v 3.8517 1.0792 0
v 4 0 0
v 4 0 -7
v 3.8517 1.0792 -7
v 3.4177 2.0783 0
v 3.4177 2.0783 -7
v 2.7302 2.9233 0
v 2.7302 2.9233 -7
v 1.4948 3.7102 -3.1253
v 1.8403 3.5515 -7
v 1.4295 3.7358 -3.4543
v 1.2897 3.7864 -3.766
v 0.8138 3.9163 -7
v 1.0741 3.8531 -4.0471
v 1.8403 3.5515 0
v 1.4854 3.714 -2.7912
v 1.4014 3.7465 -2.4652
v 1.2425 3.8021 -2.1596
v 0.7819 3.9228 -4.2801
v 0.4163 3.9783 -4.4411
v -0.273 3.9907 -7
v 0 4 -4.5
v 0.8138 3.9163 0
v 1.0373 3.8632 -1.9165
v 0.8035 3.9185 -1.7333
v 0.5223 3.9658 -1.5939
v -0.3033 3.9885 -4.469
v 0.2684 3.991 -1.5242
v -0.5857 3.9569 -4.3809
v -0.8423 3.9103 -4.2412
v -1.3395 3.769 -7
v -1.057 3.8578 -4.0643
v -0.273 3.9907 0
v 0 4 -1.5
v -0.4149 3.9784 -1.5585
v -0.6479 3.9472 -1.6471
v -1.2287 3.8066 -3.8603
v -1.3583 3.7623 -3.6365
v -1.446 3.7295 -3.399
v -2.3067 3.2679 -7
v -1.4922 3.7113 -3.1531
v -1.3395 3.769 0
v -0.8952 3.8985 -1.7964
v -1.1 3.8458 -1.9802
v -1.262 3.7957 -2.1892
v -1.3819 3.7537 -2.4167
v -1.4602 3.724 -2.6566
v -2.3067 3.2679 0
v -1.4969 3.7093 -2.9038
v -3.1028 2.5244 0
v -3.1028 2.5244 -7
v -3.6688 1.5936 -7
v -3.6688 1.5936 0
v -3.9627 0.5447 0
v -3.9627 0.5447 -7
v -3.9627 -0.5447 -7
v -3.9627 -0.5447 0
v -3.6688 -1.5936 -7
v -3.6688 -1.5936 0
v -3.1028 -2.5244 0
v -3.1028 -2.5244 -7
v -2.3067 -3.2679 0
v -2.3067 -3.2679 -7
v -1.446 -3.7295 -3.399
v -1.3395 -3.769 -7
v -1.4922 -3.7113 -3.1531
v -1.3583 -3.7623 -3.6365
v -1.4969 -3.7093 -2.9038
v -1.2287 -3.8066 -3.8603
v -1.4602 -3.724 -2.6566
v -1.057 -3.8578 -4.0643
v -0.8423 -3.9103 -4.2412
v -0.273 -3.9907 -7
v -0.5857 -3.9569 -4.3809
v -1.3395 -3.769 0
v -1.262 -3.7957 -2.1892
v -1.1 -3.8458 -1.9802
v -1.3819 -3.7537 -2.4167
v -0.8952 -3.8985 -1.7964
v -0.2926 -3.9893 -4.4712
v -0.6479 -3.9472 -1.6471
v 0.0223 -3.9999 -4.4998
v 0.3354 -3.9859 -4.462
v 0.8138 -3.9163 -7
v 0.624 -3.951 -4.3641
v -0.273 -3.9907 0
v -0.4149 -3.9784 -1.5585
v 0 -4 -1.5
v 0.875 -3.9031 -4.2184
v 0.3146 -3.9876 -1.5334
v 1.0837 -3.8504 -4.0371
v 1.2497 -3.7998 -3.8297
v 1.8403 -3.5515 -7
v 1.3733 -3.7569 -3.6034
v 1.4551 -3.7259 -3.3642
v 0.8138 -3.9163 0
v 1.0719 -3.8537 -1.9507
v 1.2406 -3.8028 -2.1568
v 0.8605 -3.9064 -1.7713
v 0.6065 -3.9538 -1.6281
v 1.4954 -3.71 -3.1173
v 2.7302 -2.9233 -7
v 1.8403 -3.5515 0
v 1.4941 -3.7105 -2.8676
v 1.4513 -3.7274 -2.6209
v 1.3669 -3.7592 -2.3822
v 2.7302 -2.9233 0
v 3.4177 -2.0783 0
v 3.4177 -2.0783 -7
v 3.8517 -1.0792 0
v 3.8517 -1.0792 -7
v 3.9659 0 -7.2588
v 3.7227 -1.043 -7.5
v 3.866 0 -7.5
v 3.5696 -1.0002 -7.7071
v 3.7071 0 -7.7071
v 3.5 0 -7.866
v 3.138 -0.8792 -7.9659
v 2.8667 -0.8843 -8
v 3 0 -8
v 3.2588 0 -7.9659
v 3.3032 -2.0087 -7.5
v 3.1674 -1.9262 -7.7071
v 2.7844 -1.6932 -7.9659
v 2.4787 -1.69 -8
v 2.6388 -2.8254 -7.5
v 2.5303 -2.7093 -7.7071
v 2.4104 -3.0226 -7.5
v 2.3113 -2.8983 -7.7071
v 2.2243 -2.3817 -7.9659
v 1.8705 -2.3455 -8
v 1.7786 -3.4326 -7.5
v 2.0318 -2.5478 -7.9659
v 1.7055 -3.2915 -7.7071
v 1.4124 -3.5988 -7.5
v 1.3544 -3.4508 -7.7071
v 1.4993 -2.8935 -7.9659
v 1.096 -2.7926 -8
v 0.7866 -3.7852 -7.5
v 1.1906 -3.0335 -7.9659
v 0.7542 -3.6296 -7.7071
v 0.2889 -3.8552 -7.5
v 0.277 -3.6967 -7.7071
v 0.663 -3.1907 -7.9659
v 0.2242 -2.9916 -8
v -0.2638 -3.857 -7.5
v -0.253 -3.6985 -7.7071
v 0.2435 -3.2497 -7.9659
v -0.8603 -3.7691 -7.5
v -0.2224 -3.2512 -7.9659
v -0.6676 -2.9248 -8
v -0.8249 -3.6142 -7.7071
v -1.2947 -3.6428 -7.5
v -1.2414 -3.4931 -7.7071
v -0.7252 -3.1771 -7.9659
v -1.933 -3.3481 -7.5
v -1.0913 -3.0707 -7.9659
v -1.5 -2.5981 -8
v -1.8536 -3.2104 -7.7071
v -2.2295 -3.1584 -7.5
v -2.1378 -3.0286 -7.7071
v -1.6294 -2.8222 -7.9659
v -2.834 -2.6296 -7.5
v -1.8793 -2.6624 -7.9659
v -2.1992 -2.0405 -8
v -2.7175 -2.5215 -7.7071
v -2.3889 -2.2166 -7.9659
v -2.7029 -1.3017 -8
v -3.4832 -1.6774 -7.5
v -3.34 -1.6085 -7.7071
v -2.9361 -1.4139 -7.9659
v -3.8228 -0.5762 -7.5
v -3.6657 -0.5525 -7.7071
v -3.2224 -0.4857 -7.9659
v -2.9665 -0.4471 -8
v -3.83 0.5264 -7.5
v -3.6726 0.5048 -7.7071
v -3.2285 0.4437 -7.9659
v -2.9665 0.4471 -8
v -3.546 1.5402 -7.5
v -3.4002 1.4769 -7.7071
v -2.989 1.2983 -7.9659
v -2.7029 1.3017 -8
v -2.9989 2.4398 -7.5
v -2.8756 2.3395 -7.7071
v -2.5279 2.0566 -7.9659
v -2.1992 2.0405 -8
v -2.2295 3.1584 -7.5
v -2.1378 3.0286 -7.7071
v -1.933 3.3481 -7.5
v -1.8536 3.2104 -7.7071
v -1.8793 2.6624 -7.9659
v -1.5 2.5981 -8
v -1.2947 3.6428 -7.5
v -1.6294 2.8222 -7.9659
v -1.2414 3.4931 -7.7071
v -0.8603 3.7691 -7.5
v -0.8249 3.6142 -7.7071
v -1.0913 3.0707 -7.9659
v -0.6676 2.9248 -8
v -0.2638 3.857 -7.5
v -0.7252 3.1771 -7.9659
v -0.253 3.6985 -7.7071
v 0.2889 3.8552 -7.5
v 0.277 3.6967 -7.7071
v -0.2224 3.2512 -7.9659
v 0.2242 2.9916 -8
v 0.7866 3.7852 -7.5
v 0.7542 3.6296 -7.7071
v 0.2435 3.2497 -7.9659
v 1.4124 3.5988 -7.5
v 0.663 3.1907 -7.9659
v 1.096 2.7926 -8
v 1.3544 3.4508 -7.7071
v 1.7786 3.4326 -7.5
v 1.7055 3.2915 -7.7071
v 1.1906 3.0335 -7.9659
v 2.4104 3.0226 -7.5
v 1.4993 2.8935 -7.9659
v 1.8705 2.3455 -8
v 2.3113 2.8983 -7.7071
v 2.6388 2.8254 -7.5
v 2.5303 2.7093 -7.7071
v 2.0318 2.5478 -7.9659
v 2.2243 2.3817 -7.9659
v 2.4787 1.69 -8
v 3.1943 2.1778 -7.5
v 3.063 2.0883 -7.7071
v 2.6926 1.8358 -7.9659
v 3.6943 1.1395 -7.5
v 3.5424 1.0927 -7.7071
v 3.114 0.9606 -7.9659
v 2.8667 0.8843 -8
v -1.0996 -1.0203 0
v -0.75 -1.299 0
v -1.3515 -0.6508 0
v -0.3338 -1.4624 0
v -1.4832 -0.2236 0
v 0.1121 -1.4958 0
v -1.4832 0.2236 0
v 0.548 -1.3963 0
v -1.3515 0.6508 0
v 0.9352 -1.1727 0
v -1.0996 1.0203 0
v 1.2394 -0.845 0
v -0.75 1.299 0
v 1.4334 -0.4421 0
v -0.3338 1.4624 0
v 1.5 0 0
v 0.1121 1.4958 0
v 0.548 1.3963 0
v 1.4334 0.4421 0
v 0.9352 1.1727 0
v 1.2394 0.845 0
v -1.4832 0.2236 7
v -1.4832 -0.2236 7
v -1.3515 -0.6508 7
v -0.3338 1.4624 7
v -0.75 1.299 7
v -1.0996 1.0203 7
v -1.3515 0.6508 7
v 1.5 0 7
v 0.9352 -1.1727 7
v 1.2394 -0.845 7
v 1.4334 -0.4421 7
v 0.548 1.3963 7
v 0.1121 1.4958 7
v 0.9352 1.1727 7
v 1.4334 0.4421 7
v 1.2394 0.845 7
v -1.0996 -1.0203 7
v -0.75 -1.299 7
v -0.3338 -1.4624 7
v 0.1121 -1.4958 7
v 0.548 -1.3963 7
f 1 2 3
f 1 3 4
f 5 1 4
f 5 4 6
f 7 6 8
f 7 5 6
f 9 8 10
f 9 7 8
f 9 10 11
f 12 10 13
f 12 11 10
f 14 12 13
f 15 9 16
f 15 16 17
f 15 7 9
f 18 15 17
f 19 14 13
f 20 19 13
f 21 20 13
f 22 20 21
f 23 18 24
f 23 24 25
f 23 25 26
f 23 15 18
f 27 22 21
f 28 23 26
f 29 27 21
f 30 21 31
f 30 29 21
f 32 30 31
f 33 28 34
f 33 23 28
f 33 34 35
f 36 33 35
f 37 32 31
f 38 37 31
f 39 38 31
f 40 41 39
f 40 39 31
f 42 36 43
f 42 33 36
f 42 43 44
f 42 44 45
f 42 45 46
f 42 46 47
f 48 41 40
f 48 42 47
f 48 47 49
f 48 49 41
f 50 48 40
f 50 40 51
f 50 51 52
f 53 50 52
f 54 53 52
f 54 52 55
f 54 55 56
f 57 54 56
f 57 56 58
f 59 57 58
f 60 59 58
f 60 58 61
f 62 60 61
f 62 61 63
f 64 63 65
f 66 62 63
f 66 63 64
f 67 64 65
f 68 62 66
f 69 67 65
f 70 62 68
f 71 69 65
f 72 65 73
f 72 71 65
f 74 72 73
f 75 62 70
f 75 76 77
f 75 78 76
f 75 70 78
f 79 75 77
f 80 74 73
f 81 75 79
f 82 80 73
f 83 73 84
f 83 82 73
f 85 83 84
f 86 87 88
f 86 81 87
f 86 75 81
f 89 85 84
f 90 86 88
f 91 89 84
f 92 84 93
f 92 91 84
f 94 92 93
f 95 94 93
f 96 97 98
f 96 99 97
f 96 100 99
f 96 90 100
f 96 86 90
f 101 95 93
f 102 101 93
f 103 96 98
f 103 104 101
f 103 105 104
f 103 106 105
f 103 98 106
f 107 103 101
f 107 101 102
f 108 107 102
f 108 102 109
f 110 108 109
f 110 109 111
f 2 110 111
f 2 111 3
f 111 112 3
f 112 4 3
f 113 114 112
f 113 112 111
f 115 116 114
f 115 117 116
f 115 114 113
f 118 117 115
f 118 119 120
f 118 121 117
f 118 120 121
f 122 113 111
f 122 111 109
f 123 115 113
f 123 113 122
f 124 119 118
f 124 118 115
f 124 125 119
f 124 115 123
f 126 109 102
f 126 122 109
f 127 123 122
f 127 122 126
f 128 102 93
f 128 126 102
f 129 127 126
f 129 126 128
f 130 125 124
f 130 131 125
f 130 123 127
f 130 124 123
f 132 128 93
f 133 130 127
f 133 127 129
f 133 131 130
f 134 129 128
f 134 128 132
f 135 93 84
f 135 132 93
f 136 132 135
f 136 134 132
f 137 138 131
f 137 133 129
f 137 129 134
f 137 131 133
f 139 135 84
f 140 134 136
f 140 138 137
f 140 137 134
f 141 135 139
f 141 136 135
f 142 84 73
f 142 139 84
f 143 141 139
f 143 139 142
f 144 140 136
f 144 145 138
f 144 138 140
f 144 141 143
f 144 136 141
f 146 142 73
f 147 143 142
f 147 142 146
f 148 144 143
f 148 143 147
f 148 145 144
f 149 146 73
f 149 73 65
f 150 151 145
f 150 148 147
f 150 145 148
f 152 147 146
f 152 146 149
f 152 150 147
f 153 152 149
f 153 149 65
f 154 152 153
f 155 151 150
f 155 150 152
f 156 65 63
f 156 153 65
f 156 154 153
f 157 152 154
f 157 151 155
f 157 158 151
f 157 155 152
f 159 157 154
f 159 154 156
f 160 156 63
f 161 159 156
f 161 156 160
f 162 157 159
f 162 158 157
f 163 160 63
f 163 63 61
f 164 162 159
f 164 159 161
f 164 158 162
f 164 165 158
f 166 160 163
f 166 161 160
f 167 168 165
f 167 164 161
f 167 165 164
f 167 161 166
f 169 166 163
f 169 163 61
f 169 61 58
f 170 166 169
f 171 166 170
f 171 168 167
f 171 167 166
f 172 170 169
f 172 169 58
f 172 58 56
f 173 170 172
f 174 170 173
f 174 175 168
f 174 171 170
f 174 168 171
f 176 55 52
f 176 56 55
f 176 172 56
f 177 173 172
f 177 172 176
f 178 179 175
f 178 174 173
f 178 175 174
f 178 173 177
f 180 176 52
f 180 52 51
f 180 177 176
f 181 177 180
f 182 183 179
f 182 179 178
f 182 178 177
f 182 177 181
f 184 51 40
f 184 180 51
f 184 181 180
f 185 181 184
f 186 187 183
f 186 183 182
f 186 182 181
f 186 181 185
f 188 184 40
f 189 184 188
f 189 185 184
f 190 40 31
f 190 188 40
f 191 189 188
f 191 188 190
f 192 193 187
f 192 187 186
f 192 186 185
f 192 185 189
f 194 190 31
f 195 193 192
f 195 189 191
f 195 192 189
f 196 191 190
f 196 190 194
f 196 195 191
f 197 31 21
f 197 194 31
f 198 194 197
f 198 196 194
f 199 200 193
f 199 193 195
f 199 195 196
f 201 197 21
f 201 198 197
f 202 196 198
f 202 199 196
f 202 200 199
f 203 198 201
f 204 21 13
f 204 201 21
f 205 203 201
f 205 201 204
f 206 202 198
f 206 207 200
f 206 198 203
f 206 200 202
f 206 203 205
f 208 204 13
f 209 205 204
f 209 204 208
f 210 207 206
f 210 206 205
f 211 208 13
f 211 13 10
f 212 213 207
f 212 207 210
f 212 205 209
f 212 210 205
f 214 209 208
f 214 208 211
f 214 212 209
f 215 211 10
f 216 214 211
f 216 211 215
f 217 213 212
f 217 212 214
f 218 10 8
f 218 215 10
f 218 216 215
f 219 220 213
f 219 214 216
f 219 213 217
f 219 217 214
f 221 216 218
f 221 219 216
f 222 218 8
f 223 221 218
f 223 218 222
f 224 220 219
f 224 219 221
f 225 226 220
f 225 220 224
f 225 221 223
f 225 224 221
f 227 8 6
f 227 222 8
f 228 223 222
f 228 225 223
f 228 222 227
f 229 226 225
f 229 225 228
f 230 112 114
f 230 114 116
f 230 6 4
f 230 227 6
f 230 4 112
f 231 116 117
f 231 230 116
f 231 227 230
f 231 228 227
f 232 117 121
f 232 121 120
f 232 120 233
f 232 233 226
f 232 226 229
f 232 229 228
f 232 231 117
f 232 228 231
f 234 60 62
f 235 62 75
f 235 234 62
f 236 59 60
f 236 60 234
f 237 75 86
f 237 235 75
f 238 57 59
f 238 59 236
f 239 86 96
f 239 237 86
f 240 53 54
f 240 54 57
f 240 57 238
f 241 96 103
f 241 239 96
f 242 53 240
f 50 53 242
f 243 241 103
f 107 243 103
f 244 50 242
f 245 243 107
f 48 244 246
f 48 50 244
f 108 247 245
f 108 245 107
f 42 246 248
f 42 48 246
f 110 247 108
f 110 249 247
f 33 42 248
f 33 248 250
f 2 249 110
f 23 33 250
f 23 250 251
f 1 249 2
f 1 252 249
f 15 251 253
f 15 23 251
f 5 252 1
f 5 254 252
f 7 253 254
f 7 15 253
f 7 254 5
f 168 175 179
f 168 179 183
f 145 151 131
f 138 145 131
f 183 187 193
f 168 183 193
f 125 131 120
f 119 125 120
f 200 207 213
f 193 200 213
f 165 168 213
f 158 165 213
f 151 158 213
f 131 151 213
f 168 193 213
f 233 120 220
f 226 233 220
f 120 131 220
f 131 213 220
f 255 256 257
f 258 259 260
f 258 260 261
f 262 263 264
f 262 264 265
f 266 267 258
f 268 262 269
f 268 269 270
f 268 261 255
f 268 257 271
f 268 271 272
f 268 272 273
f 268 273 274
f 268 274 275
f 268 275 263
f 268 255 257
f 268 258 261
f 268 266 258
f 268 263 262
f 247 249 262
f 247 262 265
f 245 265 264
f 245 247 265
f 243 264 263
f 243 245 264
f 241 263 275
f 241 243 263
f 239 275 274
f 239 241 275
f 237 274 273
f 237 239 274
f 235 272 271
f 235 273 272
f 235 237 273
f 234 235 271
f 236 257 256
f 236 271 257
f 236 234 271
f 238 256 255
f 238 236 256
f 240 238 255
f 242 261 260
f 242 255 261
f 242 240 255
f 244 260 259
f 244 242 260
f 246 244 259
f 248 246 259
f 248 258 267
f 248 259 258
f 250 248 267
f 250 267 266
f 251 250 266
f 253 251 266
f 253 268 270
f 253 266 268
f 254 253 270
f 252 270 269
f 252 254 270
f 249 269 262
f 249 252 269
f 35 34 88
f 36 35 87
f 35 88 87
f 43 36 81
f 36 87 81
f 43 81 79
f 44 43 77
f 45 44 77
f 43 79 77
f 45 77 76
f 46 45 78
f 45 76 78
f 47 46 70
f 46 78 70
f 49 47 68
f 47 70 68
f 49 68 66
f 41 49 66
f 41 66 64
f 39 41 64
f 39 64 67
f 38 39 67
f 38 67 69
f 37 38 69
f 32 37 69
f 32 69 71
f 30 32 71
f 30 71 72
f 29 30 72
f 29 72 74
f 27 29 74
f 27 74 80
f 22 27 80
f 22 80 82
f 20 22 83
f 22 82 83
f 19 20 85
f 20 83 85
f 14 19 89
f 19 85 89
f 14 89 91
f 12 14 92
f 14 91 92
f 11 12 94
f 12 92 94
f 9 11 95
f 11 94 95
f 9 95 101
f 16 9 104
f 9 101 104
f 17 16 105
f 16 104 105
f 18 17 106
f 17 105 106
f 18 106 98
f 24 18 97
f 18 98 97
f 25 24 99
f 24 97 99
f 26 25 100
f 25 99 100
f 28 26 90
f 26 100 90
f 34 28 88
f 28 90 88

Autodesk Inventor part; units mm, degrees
ref_plane "YZ Plane" through (0, 0, 0) normal (1, 0, 0) x (0, 1, 0)
ref_plane "XY Plane" through (0, 0, 0) normal (0, 0, 1) x (1, 0, 0)
sketch "Sketch1" plane through (0, 0, 0) normal (0, 0, 1) x (1, 0, 0)
  circle A0 centre (0, 0) radius 4
  dimension "d0" = 8
extrude "Extrusion1" add sketch "Sketch1" against normal blind 8
sketch "Sketch2" plane through (0, 0, 0) normal (0, 0, 1) x (1, 0, 0)
  circle A0 centre (0, 0) radius 4 projected
  circle A1 centre (0, 0) radius 1.5
  dimension "d3" = 3
extrude "Extrusion2" add sketch "Sketch2" along normal blind 7 contours A1
thread "Thread1" size "M3x0.5" class "6g" standard "ANSI Metric M Profile" length 4
fillet "Fillet1" radius 1 1 edges at (-4, 0, -8)
ref_plane "Work Plane1" through (0, 4, 0) normal (0, 1, 0) x (-1, 0, 0)
sketch "Sketch3" plane through (0, 4, 0) normal (0, 1, 0) x (-1, 0, 0)
  line L0 (4, 0) -> (-4, 0) projected
  line L1 (-4, -7) -> (4, -7) projected
  arc A0 (0, 0) -> (0, 0) centre (3, -7) ccw projected
  line L2 (3, -8) -> (-3, -8) projected
  line L3 (4, 0) -> (4, -7) projected
  line L4 (-4, 0) -> (-4, -7) projected
  point P0 (0, -3)
  point P1 (0, -8)
  dimension "d10" = 5
  dimension "d11" = 4
hole "Hole1" at (0, 4, -3) direction (0, -1, 0) diameter 3 end through all
properties part number "33 - Eccentric Swivel Screw" material "Bronze, Soft Tin"
